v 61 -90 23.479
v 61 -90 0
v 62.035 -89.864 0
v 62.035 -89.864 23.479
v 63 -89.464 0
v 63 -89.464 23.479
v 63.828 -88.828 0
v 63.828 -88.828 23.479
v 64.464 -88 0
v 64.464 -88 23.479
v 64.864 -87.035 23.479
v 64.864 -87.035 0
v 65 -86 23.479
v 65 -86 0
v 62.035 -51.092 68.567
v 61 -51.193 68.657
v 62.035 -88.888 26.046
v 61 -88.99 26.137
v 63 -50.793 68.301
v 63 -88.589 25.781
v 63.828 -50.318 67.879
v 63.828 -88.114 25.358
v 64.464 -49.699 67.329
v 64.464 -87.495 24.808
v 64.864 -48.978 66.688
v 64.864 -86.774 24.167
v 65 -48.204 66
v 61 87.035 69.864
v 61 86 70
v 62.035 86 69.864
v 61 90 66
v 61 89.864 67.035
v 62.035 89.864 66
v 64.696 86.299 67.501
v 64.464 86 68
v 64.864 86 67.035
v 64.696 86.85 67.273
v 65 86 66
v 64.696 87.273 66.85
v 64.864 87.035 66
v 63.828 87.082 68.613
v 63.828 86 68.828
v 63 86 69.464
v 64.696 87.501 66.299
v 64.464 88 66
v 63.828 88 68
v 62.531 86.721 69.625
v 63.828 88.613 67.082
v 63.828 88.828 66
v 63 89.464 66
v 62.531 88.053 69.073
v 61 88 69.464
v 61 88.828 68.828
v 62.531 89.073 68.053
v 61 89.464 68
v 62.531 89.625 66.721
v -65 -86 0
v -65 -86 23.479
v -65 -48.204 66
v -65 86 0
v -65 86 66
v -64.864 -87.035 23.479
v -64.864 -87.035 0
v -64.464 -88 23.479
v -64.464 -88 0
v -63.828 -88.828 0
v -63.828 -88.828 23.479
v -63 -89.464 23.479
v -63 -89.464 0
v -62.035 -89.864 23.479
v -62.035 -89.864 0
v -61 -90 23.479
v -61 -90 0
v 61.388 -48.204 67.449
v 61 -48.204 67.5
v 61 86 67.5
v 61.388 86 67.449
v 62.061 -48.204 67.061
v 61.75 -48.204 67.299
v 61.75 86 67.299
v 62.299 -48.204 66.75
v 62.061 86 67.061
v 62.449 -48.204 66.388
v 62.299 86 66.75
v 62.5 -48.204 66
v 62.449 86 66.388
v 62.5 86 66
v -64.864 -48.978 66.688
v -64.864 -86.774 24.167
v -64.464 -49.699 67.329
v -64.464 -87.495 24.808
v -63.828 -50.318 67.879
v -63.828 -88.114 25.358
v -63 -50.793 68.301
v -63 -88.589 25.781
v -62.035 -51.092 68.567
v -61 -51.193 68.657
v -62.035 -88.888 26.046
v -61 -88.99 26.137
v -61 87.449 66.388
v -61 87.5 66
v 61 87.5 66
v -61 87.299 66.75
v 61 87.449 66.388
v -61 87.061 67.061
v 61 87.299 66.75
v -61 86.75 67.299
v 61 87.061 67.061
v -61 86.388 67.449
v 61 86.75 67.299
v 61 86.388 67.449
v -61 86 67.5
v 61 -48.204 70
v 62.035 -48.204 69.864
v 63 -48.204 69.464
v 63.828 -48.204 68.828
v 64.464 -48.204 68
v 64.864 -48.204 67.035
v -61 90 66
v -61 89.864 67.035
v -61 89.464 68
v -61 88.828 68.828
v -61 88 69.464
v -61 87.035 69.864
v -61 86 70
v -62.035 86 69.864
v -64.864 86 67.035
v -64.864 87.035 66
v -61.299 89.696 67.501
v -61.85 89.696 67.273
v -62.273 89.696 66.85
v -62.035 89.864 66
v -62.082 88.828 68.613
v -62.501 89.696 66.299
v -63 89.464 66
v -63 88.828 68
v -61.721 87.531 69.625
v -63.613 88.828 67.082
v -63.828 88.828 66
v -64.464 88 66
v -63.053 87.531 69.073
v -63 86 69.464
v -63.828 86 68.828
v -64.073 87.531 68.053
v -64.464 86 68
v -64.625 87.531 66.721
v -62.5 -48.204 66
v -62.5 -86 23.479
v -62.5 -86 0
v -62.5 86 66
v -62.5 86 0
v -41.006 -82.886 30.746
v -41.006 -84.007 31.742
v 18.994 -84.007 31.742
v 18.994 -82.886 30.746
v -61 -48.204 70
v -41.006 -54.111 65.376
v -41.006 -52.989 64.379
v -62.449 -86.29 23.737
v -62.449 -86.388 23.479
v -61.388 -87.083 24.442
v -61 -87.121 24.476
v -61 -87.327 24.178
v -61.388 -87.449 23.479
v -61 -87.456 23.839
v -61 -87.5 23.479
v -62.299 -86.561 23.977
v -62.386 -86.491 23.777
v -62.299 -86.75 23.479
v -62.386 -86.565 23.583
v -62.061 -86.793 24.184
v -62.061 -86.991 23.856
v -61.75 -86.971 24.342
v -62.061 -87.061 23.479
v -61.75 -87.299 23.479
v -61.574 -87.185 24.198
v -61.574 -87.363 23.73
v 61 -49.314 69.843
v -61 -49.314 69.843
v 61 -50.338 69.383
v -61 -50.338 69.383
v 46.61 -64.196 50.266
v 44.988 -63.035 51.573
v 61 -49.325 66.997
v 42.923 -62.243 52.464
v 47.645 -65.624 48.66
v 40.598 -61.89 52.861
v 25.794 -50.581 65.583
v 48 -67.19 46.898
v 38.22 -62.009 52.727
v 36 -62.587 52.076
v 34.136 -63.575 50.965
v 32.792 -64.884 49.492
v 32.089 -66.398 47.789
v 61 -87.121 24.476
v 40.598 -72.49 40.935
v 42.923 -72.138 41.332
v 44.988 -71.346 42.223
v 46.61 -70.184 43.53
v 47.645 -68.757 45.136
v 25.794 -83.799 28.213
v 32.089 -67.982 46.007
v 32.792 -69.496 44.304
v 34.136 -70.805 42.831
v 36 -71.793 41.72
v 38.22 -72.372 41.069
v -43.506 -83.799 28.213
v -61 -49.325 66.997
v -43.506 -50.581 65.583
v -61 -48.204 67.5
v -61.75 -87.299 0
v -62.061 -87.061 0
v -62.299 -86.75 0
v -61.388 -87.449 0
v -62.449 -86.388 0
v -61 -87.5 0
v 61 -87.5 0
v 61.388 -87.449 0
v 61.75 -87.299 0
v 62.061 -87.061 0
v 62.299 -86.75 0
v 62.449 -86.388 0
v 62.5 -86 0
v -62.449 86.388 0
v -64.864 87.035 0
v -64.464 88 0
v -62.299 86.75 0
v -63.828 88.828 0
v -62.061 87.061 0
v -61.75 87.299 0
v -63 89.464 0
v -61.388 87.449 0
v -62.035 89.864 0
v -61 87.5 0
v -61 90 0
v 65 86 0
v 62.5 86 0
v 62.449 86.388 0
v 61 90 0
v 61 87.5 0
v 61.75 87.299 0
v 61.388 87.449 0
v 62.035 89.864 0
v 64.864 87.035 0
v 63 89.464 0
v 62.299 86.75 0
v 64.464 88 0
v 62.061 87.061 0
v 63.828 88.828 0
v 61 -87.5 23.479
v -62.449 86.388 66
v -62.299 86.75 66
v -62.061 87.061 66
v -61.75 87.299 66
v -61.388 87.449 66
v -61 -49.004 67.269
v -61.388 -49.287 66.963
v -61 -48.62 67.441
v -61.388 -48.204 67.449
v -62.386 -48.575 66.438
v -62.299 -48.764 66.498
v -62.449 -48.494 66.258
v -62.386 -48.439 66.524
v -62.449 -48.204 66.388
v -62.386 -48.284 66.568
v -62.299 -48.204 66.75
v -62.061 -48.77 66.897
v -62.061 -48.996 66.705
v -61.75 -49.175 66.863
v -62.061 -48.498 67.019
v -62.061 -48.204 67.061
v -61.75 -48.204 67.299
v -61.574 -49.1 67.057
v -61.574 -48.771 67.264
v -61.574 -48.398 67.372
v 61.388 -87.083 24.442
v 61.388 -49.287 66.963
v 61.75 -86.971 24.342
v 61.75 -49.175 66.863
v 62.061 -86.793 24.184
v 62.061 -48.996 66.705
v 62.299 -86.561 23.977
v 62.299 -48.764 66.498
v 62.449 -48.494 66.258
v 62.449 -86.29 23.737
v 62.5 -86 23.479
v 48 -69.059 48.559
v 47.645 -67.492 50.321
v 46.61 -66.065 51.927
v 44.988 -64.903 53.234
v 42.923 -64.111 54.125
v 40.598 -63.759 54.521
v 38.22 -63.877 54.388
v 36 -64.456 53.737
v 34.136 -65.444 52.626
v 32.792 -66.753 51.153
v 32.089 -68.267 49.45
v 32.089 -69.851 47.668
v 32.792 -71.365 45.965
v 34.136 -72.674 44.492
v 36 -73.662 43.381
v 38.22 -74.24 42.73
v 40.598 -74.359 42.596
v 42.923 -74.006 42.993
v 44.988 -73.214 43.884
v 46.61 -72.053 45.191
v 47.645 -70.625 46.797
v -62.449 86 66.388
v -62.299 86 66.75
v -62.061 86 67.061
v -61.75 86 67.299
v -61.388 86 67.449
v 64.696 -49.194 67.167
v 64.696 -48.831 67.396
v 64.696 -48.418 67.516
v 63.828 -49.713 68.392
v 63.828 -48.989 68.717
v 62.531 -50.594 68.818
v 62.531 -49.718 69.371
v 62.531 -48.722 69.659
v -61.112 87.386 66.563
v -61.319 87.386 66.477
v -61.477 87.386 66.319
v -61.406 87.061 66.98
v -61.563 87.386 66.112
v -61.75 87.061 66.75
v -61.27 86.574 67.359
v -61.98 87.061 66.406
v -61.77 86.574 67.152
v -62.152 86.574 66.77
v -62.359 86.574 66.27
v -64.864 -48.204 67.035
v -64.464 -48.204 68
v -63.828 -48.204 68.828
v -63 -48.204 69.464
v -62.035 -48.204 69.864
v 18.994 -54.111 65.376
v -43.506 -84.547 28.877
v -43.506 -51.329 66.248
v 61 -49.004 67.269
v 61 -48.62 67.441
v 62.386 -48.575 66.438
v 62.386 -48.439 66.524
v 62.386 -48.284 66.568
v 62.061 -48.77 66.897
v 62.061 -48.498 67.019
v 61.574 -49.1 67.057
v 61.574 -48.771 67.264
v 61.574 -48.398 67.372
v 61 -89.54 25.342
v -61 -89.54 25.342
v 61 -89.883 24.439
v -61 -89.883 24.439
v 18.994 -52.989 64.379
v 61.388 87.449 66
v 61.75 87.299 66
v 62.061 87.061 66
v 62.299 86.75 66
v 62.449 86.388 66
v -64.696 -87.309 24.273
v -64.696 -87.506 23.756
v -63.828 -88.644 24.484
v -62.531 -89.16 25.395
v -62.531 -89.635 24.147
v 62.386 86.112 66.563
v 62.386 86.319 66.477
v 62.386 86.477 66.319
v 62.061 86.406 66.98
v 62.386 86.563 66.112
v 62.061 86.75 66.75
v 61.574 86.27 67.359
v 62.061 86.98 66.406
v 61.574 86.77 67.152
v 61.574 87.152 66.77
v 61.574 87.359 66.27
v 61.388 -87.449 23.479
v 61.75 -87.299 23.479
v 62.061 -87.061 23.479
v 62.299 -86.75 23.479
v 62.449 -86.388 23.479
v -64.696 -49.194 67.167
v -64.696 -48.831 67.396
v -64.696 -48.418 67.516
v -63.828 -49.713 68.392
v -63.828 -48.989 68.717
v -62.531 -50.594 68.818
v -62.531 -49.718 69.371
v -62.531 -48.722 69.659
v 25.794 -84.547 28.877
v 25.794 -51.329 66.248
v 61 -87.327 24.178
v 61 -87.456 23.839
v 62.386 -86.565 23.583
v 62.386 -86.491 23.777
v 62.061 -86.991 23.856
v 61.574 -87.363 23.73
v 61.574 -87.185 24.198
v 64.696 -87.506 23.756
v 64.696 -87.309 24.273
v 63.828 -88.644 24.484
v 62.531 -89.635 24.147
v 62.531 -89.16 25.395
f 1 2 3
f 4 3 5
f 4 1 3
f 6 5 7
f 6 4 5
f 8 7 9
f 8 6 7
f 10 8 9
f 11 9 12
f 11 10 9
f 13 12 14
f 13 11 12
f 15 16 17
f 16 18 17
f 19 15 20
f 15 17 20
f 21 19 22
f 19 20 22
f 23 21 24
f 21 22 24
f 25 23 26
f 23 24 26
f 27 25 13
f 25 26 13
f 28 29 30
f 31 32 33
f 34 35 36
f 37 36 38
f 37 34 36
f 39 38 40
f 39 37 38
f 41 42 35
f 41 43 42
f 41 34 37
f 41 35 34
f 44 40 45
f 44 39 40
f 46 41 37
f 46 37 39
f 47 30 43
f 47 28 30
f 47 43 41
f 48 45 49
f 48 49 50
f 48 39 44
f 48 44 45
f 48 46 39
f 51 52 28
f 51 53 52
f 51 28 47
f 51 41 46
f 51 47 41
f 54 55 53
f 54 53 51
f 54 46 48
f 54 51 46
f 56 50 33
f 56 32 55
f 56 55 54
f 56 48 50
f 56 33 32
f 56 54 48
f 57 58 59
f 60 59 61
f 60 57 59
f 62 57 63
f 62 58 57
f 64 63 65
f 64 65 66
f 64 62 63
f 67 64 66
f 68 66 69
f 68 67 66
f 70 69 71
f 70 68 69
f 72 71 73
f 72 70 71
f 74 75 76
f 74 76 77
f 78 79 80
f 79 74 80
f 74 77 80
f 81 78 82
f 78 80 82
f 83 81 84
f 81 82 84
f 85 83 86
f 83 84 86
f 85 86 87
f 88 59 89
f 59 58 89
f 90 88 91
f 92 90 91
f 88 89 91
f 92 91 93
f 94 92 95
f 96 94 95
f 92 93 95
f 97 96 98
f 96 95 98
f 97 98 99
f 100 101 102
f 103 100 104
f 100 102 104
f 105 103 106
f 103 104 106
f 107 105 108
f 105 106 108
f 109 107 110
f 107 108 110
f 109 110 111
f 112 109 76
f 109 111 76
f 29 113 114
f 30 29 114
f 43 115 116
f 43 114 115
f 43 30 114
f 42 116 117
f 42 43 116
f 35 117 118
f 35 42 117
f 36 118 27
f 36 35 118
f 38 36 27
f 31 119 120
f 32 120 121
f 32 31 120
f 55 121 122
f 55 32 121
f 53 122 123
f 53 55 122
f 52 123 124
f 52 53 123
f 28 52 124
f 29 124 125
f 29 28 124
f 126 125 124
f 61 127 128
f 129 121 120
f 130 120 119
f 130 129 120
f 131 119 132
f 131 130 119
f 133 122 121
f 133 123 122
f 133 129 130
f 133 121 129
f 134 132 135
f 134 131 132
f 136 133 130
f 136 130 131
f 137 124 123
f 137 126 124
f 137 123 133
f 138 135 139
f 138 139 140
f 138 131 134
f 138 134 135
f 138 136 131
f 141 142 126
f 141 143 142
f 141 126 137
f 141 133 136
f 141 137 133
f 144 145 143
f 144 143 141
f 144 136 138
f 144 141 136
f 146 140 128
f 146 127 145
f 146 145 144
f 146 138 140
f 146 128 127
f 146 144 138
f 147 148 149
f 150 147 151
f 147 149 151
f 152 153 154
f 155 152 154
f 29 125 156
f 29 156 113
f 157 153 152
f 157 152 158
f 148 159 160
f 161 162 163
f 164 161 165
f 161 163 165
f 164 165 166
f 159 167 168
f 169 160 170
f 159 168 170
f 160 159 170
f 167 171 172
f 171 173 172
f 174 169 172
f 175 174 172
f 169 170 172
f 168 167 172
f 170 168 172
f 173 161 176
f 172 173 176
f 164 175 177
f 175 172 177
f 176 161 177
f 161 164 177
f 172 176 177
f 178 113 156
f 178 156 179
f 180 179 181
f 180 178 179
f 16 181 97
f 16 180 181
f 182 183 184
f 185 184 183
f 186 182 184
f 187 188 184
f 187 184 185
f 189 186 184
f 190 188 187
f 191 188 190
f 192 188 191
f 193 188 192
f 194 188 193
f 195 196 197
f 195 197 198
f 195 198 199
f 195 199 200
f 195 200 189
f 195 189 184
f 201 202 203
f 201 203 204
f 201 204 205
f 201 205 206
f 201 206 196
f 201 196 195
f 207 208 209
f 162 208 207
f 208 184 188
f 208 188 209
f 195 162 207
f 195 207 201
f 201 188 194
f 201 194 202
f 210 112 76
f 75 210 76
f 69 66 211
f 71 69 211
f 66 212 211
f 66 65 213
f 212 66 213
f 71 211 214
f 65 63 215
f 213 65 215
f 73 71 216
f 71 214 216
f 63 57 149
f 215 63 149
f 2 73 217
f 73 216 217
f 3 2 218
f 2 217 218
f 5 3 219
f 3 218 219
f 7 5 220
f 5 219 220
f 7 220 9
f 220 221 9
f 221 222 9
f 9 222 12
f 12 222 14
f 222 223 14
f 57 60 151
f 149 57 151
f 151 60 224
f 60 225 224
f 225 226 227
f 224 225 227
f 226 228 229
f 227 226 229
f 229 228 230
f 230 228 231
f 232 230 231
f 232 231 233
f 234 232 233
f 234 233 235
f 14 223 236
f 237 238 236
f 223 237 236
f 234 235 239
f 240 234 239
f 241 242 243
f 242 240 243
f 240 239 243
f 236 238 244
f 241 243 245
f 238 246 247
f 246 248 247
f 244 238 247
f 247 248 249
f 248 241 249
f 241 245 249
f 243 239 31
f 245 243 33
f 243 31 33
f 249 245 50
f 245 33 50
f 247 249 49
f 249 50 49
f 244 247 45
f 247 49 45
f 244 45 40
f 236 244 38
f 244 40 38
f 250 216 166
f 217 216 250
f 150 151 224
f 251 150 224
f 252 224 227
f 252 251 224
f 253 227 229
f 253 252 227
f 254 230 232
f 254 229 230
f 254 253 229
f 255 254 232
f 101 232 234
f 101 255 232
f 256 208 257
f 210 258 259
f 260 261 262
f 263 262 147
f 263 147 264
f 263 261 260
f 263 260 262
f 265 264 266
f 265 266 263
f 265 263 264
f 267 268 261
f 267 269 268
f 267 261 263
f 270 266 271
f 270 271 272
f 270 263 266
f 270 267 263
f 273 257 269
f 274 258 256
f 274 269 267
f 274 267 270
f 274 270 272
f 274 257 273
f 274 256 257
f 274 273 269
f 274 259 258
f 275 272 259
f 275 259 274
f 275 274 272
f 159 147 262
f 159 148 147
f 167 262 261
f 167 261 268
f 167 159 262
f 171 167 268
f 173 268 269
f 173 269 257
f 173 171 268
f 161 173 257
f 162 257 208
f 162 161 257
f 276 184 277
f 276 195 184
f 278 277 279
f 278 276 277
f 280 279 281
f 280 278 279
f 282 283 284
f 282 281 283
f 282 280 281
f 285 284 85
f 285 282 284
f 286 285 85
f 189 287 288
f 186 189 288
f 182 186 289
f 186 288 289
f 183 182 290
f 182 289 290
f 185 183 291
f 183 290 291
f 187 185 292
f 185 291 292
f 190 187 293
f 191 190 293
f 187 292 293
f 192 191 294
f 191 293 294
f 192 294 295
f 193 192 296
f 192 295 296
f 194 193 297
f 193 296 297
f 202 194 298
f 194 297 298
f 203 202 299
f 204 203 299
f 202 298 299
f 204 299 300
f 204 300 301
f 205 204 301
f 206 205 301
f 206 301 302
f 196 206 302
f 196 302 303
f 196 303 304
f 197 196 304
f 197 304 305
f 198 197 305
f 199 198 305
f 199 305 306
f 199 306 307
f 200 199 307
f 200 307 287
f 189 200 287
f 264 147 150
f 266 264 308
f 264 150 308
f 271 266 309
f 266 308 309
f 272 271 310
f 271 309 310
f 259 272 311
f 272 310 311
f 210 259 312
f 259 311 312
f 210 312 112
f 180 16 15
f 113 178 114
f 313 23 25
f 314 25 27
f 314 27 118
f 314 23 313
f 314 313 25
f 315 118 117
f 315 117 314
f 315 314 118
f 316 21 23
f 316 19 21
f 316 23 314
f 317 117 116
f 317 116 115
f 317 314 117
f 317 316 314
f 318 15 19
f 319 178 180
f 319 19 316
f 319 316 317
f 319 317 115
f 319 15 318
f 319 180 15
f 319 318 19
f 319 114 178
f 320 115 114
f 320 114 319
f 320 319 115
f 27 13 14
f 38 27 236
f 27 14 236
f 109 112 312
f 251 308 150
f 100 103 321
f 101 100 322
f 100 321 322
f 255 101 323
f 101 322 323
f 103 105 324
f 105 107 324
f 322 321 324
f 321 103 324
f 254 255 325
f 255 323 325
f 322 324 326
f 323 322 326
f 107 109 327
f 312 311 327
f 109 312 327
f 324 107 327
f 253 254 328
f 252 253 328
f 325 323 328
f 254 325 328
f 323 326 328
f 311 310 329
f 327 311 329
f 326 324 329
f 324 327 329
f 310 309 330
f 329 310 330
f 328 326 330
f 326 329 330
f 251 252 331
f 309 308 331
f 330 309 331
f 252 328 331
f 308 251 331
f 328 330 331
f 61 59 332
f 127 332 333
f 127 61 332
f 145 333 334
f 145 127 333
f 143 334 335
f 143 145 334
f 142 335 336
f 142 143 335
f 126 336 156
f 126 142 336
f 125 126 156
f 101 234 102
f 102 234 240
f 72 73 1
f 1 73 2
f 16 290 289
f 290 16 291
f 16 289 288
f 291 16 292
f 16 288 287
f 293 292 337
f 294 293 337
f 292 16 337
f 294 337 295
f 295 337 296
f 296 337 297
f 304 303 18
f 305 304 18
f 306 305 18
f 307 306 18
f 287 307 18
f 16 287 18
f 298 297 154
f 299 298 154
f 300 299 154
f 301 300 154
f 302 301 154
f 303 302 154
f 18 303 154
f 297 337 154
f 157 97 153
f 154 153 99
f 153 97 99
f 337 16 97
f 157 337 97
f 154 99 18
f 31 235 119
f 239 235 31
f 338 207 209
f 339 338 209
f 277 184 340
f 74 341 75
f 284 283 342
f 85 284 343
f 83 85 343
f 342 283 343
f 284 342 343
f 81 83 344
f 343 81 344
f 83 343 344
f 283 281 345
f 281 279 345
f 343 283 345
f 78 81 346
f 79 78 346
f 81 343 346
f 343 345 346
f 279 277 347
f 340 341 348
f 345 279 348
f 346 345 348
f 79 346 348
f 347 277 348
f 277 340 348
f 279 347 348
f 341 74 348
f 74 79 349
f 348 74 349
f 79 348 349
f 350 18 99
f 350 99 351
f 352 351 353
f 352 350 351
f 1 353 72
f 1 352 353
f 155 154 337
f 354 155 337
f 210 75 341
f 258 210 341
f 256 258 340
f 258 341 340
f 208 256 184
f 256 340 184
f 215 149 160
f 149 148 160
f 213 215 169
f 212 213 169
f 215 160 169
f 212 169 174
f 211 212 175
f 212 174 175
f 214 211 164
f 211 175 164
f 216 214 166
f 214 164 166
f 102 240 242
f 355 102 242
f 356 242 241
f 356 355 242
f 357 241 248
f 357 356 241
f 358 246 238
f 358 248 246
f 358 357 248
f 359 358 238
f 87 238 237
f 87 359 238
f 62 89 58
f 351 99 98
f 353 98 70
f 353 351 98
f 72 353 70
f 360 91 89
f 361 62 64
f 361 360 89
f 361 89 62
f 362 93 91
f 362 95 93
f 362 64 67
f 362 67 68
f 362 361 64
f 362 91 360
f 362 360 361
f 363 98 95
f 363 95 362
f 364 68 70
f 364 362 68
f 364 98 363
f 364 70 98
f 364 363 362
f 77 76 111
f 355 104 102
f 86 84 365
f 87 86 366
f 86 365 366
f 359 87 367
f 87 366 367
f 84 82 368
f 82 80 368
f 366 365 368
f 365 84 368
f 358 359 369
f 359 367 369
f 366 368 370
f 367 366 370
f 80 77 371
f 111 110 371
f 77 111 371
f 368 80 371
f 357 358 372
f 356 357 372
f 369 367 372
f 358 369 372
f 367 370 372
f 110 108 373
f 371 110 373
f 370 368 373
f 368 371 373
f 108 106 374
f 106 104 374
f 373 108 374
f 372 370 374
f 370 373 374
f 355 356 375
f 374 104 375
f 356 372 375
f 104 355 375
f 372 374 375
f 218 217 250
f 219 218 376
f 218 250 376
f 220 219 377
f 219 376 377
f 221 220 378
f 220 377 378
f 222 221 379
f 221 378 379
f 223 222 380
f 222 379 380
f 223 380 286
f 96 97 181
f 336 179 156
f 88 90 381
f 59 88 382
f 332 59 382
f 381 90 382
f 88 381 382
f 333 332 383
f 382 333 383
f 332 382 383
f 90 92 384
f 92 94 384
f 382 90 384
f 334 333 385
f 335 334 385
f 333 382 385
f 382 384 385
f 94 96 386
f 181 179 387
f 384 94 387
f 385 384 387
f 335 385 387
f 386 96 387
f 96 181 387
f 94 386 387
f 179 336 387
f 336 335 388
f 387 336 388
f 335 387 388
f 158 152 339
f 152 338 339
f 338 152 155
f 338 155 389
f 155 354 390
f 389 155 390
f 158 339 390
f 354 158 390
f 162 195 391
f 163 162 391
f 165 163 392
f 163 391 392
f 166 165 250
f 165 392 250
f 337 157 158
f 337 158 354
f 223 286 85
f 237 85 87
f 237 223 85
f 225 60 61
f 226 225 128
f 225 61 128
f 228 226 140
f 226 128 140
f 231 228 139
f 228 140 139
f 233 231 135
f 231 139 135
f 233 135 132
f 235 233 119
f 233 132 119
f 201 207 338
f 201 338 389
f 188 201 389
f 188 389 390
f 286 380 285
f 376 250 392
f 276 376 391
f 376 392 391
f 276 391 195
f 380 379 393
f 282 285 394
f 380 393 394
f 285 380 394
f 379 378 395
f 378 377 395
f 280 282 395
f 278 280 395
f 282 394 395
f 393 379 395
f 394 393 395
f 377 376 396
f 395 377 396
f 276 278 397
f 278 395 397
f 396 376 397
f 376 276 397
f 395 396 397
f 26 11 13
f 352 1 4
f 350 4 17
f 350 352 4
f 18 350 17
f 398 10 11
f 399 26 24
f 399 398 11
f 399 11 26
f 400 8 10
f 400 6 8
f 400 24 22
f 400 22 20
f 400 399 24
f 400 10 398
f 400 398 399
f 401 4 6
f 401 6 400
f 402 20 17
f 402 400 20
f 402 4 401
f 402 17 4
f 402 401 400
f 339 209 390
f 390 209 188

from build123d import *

# Parameters (mm, degrees)
SKETCH1_W           = 130
SKETCH1_H           = 180
BOSS_EXTRUDE1_DEPTH = 70
CUT_EXTRUDE1_DEPTH  = 131
FILLET2_R           = 4
SHELL1_T            = -2.5
SKETCH3_R           = 8
SKETCH3_W           = 60
SKETCH3_H           = 45
CUT_EXTRUDE2_DEPTH  = 10
CUT_EXTRUDE3_START  = -2.5
SKETCH4_W           = 69.3
SKETCH4_H           = 50
CUT_EXTRUDE3_DEPTH  = 1


with BuildPart() as part:
    # Sketch1 → Boss-Extrude1 (new body)
    with BuildSketch(Plane.XY):
        Rectangle(SKETCH1_W, SKETCH1_H)
    extrude(amount=BOSS_EXTRUDE1_DEPTH)

    # Sketch2 → Cut-Extrude1 (cut, through all)
    with BuildSketch(Plane.ZY.offset(65)):
        Polygon((70, -50), (25, -90), (70, -90), align=None)
    extrude(amount=-CUT_EXTRUDE1_DEPTH, mode=Mode.SUBTRACT)

    # Fillet2
    fillet2_edges = [part.edges().sort_by_distance(p)[0] for p in [
        (-65, 20, 70),
        (65, -90, 12.5),
        (-65, -90, 12.5),
        (0, -50, 70),
        (65, -70, 47.5),
        (0, -90, 25),
        (-65, -70, 47.5),
        (0, 90, 70),
        (65, 20, 70),
        (-65, 90, 35),
        (65, 90, 35),
    ]]
    fillet(fillet2_edges, radius=FILLET2_R)

    # Shell1
    shell1_openings = [part.faces().sort_by_distance(p)[0] for p in [
        (0, 0, 0),
    ]]
    offset(amount=SHELL1_T, openings=shell1_openings, kind=Kind.INTERSECTION)

    # Sketch3 → Cut-Extrude2 (cut)
    with BuildSketch(Plane(origin=(0, -62.689655172, 55.724137931), x_dir=(1, 0, 0), z_dir=(0, -0.747409319, 0.664363839))):
        with Locations((40.000108275, -9.586715238)):
            Circle(SKETCH3_R)
        with Locations((-11.005976929, -9.586715238)):
            Rectangle(SKETCH3_W, SKETCH3_H)
    extrude(amount=-CUT_EXTRUDE2_DEPTH, mode=Mode.SUBTRACT)

    # Sketch4 → Cut-Extrude3 (cut)
    with BuildSketch(Plane(origin=(0, -62.689655172, 55.724137931), x_dir=(1, 0, 0), z_dir=(0, -0.747409319, 0.664363839)).offset(CUT_EXTRUDE3_START)):
        with Locations((-8.85597671, -9.586715238)):
            Rectangle(SKETCH4_W, SKETCH4_H)
    extrude(amount=CUT_EXTRUDE3_DEPTH, mode=Mode.SUBTRACT)


solid = part.part
